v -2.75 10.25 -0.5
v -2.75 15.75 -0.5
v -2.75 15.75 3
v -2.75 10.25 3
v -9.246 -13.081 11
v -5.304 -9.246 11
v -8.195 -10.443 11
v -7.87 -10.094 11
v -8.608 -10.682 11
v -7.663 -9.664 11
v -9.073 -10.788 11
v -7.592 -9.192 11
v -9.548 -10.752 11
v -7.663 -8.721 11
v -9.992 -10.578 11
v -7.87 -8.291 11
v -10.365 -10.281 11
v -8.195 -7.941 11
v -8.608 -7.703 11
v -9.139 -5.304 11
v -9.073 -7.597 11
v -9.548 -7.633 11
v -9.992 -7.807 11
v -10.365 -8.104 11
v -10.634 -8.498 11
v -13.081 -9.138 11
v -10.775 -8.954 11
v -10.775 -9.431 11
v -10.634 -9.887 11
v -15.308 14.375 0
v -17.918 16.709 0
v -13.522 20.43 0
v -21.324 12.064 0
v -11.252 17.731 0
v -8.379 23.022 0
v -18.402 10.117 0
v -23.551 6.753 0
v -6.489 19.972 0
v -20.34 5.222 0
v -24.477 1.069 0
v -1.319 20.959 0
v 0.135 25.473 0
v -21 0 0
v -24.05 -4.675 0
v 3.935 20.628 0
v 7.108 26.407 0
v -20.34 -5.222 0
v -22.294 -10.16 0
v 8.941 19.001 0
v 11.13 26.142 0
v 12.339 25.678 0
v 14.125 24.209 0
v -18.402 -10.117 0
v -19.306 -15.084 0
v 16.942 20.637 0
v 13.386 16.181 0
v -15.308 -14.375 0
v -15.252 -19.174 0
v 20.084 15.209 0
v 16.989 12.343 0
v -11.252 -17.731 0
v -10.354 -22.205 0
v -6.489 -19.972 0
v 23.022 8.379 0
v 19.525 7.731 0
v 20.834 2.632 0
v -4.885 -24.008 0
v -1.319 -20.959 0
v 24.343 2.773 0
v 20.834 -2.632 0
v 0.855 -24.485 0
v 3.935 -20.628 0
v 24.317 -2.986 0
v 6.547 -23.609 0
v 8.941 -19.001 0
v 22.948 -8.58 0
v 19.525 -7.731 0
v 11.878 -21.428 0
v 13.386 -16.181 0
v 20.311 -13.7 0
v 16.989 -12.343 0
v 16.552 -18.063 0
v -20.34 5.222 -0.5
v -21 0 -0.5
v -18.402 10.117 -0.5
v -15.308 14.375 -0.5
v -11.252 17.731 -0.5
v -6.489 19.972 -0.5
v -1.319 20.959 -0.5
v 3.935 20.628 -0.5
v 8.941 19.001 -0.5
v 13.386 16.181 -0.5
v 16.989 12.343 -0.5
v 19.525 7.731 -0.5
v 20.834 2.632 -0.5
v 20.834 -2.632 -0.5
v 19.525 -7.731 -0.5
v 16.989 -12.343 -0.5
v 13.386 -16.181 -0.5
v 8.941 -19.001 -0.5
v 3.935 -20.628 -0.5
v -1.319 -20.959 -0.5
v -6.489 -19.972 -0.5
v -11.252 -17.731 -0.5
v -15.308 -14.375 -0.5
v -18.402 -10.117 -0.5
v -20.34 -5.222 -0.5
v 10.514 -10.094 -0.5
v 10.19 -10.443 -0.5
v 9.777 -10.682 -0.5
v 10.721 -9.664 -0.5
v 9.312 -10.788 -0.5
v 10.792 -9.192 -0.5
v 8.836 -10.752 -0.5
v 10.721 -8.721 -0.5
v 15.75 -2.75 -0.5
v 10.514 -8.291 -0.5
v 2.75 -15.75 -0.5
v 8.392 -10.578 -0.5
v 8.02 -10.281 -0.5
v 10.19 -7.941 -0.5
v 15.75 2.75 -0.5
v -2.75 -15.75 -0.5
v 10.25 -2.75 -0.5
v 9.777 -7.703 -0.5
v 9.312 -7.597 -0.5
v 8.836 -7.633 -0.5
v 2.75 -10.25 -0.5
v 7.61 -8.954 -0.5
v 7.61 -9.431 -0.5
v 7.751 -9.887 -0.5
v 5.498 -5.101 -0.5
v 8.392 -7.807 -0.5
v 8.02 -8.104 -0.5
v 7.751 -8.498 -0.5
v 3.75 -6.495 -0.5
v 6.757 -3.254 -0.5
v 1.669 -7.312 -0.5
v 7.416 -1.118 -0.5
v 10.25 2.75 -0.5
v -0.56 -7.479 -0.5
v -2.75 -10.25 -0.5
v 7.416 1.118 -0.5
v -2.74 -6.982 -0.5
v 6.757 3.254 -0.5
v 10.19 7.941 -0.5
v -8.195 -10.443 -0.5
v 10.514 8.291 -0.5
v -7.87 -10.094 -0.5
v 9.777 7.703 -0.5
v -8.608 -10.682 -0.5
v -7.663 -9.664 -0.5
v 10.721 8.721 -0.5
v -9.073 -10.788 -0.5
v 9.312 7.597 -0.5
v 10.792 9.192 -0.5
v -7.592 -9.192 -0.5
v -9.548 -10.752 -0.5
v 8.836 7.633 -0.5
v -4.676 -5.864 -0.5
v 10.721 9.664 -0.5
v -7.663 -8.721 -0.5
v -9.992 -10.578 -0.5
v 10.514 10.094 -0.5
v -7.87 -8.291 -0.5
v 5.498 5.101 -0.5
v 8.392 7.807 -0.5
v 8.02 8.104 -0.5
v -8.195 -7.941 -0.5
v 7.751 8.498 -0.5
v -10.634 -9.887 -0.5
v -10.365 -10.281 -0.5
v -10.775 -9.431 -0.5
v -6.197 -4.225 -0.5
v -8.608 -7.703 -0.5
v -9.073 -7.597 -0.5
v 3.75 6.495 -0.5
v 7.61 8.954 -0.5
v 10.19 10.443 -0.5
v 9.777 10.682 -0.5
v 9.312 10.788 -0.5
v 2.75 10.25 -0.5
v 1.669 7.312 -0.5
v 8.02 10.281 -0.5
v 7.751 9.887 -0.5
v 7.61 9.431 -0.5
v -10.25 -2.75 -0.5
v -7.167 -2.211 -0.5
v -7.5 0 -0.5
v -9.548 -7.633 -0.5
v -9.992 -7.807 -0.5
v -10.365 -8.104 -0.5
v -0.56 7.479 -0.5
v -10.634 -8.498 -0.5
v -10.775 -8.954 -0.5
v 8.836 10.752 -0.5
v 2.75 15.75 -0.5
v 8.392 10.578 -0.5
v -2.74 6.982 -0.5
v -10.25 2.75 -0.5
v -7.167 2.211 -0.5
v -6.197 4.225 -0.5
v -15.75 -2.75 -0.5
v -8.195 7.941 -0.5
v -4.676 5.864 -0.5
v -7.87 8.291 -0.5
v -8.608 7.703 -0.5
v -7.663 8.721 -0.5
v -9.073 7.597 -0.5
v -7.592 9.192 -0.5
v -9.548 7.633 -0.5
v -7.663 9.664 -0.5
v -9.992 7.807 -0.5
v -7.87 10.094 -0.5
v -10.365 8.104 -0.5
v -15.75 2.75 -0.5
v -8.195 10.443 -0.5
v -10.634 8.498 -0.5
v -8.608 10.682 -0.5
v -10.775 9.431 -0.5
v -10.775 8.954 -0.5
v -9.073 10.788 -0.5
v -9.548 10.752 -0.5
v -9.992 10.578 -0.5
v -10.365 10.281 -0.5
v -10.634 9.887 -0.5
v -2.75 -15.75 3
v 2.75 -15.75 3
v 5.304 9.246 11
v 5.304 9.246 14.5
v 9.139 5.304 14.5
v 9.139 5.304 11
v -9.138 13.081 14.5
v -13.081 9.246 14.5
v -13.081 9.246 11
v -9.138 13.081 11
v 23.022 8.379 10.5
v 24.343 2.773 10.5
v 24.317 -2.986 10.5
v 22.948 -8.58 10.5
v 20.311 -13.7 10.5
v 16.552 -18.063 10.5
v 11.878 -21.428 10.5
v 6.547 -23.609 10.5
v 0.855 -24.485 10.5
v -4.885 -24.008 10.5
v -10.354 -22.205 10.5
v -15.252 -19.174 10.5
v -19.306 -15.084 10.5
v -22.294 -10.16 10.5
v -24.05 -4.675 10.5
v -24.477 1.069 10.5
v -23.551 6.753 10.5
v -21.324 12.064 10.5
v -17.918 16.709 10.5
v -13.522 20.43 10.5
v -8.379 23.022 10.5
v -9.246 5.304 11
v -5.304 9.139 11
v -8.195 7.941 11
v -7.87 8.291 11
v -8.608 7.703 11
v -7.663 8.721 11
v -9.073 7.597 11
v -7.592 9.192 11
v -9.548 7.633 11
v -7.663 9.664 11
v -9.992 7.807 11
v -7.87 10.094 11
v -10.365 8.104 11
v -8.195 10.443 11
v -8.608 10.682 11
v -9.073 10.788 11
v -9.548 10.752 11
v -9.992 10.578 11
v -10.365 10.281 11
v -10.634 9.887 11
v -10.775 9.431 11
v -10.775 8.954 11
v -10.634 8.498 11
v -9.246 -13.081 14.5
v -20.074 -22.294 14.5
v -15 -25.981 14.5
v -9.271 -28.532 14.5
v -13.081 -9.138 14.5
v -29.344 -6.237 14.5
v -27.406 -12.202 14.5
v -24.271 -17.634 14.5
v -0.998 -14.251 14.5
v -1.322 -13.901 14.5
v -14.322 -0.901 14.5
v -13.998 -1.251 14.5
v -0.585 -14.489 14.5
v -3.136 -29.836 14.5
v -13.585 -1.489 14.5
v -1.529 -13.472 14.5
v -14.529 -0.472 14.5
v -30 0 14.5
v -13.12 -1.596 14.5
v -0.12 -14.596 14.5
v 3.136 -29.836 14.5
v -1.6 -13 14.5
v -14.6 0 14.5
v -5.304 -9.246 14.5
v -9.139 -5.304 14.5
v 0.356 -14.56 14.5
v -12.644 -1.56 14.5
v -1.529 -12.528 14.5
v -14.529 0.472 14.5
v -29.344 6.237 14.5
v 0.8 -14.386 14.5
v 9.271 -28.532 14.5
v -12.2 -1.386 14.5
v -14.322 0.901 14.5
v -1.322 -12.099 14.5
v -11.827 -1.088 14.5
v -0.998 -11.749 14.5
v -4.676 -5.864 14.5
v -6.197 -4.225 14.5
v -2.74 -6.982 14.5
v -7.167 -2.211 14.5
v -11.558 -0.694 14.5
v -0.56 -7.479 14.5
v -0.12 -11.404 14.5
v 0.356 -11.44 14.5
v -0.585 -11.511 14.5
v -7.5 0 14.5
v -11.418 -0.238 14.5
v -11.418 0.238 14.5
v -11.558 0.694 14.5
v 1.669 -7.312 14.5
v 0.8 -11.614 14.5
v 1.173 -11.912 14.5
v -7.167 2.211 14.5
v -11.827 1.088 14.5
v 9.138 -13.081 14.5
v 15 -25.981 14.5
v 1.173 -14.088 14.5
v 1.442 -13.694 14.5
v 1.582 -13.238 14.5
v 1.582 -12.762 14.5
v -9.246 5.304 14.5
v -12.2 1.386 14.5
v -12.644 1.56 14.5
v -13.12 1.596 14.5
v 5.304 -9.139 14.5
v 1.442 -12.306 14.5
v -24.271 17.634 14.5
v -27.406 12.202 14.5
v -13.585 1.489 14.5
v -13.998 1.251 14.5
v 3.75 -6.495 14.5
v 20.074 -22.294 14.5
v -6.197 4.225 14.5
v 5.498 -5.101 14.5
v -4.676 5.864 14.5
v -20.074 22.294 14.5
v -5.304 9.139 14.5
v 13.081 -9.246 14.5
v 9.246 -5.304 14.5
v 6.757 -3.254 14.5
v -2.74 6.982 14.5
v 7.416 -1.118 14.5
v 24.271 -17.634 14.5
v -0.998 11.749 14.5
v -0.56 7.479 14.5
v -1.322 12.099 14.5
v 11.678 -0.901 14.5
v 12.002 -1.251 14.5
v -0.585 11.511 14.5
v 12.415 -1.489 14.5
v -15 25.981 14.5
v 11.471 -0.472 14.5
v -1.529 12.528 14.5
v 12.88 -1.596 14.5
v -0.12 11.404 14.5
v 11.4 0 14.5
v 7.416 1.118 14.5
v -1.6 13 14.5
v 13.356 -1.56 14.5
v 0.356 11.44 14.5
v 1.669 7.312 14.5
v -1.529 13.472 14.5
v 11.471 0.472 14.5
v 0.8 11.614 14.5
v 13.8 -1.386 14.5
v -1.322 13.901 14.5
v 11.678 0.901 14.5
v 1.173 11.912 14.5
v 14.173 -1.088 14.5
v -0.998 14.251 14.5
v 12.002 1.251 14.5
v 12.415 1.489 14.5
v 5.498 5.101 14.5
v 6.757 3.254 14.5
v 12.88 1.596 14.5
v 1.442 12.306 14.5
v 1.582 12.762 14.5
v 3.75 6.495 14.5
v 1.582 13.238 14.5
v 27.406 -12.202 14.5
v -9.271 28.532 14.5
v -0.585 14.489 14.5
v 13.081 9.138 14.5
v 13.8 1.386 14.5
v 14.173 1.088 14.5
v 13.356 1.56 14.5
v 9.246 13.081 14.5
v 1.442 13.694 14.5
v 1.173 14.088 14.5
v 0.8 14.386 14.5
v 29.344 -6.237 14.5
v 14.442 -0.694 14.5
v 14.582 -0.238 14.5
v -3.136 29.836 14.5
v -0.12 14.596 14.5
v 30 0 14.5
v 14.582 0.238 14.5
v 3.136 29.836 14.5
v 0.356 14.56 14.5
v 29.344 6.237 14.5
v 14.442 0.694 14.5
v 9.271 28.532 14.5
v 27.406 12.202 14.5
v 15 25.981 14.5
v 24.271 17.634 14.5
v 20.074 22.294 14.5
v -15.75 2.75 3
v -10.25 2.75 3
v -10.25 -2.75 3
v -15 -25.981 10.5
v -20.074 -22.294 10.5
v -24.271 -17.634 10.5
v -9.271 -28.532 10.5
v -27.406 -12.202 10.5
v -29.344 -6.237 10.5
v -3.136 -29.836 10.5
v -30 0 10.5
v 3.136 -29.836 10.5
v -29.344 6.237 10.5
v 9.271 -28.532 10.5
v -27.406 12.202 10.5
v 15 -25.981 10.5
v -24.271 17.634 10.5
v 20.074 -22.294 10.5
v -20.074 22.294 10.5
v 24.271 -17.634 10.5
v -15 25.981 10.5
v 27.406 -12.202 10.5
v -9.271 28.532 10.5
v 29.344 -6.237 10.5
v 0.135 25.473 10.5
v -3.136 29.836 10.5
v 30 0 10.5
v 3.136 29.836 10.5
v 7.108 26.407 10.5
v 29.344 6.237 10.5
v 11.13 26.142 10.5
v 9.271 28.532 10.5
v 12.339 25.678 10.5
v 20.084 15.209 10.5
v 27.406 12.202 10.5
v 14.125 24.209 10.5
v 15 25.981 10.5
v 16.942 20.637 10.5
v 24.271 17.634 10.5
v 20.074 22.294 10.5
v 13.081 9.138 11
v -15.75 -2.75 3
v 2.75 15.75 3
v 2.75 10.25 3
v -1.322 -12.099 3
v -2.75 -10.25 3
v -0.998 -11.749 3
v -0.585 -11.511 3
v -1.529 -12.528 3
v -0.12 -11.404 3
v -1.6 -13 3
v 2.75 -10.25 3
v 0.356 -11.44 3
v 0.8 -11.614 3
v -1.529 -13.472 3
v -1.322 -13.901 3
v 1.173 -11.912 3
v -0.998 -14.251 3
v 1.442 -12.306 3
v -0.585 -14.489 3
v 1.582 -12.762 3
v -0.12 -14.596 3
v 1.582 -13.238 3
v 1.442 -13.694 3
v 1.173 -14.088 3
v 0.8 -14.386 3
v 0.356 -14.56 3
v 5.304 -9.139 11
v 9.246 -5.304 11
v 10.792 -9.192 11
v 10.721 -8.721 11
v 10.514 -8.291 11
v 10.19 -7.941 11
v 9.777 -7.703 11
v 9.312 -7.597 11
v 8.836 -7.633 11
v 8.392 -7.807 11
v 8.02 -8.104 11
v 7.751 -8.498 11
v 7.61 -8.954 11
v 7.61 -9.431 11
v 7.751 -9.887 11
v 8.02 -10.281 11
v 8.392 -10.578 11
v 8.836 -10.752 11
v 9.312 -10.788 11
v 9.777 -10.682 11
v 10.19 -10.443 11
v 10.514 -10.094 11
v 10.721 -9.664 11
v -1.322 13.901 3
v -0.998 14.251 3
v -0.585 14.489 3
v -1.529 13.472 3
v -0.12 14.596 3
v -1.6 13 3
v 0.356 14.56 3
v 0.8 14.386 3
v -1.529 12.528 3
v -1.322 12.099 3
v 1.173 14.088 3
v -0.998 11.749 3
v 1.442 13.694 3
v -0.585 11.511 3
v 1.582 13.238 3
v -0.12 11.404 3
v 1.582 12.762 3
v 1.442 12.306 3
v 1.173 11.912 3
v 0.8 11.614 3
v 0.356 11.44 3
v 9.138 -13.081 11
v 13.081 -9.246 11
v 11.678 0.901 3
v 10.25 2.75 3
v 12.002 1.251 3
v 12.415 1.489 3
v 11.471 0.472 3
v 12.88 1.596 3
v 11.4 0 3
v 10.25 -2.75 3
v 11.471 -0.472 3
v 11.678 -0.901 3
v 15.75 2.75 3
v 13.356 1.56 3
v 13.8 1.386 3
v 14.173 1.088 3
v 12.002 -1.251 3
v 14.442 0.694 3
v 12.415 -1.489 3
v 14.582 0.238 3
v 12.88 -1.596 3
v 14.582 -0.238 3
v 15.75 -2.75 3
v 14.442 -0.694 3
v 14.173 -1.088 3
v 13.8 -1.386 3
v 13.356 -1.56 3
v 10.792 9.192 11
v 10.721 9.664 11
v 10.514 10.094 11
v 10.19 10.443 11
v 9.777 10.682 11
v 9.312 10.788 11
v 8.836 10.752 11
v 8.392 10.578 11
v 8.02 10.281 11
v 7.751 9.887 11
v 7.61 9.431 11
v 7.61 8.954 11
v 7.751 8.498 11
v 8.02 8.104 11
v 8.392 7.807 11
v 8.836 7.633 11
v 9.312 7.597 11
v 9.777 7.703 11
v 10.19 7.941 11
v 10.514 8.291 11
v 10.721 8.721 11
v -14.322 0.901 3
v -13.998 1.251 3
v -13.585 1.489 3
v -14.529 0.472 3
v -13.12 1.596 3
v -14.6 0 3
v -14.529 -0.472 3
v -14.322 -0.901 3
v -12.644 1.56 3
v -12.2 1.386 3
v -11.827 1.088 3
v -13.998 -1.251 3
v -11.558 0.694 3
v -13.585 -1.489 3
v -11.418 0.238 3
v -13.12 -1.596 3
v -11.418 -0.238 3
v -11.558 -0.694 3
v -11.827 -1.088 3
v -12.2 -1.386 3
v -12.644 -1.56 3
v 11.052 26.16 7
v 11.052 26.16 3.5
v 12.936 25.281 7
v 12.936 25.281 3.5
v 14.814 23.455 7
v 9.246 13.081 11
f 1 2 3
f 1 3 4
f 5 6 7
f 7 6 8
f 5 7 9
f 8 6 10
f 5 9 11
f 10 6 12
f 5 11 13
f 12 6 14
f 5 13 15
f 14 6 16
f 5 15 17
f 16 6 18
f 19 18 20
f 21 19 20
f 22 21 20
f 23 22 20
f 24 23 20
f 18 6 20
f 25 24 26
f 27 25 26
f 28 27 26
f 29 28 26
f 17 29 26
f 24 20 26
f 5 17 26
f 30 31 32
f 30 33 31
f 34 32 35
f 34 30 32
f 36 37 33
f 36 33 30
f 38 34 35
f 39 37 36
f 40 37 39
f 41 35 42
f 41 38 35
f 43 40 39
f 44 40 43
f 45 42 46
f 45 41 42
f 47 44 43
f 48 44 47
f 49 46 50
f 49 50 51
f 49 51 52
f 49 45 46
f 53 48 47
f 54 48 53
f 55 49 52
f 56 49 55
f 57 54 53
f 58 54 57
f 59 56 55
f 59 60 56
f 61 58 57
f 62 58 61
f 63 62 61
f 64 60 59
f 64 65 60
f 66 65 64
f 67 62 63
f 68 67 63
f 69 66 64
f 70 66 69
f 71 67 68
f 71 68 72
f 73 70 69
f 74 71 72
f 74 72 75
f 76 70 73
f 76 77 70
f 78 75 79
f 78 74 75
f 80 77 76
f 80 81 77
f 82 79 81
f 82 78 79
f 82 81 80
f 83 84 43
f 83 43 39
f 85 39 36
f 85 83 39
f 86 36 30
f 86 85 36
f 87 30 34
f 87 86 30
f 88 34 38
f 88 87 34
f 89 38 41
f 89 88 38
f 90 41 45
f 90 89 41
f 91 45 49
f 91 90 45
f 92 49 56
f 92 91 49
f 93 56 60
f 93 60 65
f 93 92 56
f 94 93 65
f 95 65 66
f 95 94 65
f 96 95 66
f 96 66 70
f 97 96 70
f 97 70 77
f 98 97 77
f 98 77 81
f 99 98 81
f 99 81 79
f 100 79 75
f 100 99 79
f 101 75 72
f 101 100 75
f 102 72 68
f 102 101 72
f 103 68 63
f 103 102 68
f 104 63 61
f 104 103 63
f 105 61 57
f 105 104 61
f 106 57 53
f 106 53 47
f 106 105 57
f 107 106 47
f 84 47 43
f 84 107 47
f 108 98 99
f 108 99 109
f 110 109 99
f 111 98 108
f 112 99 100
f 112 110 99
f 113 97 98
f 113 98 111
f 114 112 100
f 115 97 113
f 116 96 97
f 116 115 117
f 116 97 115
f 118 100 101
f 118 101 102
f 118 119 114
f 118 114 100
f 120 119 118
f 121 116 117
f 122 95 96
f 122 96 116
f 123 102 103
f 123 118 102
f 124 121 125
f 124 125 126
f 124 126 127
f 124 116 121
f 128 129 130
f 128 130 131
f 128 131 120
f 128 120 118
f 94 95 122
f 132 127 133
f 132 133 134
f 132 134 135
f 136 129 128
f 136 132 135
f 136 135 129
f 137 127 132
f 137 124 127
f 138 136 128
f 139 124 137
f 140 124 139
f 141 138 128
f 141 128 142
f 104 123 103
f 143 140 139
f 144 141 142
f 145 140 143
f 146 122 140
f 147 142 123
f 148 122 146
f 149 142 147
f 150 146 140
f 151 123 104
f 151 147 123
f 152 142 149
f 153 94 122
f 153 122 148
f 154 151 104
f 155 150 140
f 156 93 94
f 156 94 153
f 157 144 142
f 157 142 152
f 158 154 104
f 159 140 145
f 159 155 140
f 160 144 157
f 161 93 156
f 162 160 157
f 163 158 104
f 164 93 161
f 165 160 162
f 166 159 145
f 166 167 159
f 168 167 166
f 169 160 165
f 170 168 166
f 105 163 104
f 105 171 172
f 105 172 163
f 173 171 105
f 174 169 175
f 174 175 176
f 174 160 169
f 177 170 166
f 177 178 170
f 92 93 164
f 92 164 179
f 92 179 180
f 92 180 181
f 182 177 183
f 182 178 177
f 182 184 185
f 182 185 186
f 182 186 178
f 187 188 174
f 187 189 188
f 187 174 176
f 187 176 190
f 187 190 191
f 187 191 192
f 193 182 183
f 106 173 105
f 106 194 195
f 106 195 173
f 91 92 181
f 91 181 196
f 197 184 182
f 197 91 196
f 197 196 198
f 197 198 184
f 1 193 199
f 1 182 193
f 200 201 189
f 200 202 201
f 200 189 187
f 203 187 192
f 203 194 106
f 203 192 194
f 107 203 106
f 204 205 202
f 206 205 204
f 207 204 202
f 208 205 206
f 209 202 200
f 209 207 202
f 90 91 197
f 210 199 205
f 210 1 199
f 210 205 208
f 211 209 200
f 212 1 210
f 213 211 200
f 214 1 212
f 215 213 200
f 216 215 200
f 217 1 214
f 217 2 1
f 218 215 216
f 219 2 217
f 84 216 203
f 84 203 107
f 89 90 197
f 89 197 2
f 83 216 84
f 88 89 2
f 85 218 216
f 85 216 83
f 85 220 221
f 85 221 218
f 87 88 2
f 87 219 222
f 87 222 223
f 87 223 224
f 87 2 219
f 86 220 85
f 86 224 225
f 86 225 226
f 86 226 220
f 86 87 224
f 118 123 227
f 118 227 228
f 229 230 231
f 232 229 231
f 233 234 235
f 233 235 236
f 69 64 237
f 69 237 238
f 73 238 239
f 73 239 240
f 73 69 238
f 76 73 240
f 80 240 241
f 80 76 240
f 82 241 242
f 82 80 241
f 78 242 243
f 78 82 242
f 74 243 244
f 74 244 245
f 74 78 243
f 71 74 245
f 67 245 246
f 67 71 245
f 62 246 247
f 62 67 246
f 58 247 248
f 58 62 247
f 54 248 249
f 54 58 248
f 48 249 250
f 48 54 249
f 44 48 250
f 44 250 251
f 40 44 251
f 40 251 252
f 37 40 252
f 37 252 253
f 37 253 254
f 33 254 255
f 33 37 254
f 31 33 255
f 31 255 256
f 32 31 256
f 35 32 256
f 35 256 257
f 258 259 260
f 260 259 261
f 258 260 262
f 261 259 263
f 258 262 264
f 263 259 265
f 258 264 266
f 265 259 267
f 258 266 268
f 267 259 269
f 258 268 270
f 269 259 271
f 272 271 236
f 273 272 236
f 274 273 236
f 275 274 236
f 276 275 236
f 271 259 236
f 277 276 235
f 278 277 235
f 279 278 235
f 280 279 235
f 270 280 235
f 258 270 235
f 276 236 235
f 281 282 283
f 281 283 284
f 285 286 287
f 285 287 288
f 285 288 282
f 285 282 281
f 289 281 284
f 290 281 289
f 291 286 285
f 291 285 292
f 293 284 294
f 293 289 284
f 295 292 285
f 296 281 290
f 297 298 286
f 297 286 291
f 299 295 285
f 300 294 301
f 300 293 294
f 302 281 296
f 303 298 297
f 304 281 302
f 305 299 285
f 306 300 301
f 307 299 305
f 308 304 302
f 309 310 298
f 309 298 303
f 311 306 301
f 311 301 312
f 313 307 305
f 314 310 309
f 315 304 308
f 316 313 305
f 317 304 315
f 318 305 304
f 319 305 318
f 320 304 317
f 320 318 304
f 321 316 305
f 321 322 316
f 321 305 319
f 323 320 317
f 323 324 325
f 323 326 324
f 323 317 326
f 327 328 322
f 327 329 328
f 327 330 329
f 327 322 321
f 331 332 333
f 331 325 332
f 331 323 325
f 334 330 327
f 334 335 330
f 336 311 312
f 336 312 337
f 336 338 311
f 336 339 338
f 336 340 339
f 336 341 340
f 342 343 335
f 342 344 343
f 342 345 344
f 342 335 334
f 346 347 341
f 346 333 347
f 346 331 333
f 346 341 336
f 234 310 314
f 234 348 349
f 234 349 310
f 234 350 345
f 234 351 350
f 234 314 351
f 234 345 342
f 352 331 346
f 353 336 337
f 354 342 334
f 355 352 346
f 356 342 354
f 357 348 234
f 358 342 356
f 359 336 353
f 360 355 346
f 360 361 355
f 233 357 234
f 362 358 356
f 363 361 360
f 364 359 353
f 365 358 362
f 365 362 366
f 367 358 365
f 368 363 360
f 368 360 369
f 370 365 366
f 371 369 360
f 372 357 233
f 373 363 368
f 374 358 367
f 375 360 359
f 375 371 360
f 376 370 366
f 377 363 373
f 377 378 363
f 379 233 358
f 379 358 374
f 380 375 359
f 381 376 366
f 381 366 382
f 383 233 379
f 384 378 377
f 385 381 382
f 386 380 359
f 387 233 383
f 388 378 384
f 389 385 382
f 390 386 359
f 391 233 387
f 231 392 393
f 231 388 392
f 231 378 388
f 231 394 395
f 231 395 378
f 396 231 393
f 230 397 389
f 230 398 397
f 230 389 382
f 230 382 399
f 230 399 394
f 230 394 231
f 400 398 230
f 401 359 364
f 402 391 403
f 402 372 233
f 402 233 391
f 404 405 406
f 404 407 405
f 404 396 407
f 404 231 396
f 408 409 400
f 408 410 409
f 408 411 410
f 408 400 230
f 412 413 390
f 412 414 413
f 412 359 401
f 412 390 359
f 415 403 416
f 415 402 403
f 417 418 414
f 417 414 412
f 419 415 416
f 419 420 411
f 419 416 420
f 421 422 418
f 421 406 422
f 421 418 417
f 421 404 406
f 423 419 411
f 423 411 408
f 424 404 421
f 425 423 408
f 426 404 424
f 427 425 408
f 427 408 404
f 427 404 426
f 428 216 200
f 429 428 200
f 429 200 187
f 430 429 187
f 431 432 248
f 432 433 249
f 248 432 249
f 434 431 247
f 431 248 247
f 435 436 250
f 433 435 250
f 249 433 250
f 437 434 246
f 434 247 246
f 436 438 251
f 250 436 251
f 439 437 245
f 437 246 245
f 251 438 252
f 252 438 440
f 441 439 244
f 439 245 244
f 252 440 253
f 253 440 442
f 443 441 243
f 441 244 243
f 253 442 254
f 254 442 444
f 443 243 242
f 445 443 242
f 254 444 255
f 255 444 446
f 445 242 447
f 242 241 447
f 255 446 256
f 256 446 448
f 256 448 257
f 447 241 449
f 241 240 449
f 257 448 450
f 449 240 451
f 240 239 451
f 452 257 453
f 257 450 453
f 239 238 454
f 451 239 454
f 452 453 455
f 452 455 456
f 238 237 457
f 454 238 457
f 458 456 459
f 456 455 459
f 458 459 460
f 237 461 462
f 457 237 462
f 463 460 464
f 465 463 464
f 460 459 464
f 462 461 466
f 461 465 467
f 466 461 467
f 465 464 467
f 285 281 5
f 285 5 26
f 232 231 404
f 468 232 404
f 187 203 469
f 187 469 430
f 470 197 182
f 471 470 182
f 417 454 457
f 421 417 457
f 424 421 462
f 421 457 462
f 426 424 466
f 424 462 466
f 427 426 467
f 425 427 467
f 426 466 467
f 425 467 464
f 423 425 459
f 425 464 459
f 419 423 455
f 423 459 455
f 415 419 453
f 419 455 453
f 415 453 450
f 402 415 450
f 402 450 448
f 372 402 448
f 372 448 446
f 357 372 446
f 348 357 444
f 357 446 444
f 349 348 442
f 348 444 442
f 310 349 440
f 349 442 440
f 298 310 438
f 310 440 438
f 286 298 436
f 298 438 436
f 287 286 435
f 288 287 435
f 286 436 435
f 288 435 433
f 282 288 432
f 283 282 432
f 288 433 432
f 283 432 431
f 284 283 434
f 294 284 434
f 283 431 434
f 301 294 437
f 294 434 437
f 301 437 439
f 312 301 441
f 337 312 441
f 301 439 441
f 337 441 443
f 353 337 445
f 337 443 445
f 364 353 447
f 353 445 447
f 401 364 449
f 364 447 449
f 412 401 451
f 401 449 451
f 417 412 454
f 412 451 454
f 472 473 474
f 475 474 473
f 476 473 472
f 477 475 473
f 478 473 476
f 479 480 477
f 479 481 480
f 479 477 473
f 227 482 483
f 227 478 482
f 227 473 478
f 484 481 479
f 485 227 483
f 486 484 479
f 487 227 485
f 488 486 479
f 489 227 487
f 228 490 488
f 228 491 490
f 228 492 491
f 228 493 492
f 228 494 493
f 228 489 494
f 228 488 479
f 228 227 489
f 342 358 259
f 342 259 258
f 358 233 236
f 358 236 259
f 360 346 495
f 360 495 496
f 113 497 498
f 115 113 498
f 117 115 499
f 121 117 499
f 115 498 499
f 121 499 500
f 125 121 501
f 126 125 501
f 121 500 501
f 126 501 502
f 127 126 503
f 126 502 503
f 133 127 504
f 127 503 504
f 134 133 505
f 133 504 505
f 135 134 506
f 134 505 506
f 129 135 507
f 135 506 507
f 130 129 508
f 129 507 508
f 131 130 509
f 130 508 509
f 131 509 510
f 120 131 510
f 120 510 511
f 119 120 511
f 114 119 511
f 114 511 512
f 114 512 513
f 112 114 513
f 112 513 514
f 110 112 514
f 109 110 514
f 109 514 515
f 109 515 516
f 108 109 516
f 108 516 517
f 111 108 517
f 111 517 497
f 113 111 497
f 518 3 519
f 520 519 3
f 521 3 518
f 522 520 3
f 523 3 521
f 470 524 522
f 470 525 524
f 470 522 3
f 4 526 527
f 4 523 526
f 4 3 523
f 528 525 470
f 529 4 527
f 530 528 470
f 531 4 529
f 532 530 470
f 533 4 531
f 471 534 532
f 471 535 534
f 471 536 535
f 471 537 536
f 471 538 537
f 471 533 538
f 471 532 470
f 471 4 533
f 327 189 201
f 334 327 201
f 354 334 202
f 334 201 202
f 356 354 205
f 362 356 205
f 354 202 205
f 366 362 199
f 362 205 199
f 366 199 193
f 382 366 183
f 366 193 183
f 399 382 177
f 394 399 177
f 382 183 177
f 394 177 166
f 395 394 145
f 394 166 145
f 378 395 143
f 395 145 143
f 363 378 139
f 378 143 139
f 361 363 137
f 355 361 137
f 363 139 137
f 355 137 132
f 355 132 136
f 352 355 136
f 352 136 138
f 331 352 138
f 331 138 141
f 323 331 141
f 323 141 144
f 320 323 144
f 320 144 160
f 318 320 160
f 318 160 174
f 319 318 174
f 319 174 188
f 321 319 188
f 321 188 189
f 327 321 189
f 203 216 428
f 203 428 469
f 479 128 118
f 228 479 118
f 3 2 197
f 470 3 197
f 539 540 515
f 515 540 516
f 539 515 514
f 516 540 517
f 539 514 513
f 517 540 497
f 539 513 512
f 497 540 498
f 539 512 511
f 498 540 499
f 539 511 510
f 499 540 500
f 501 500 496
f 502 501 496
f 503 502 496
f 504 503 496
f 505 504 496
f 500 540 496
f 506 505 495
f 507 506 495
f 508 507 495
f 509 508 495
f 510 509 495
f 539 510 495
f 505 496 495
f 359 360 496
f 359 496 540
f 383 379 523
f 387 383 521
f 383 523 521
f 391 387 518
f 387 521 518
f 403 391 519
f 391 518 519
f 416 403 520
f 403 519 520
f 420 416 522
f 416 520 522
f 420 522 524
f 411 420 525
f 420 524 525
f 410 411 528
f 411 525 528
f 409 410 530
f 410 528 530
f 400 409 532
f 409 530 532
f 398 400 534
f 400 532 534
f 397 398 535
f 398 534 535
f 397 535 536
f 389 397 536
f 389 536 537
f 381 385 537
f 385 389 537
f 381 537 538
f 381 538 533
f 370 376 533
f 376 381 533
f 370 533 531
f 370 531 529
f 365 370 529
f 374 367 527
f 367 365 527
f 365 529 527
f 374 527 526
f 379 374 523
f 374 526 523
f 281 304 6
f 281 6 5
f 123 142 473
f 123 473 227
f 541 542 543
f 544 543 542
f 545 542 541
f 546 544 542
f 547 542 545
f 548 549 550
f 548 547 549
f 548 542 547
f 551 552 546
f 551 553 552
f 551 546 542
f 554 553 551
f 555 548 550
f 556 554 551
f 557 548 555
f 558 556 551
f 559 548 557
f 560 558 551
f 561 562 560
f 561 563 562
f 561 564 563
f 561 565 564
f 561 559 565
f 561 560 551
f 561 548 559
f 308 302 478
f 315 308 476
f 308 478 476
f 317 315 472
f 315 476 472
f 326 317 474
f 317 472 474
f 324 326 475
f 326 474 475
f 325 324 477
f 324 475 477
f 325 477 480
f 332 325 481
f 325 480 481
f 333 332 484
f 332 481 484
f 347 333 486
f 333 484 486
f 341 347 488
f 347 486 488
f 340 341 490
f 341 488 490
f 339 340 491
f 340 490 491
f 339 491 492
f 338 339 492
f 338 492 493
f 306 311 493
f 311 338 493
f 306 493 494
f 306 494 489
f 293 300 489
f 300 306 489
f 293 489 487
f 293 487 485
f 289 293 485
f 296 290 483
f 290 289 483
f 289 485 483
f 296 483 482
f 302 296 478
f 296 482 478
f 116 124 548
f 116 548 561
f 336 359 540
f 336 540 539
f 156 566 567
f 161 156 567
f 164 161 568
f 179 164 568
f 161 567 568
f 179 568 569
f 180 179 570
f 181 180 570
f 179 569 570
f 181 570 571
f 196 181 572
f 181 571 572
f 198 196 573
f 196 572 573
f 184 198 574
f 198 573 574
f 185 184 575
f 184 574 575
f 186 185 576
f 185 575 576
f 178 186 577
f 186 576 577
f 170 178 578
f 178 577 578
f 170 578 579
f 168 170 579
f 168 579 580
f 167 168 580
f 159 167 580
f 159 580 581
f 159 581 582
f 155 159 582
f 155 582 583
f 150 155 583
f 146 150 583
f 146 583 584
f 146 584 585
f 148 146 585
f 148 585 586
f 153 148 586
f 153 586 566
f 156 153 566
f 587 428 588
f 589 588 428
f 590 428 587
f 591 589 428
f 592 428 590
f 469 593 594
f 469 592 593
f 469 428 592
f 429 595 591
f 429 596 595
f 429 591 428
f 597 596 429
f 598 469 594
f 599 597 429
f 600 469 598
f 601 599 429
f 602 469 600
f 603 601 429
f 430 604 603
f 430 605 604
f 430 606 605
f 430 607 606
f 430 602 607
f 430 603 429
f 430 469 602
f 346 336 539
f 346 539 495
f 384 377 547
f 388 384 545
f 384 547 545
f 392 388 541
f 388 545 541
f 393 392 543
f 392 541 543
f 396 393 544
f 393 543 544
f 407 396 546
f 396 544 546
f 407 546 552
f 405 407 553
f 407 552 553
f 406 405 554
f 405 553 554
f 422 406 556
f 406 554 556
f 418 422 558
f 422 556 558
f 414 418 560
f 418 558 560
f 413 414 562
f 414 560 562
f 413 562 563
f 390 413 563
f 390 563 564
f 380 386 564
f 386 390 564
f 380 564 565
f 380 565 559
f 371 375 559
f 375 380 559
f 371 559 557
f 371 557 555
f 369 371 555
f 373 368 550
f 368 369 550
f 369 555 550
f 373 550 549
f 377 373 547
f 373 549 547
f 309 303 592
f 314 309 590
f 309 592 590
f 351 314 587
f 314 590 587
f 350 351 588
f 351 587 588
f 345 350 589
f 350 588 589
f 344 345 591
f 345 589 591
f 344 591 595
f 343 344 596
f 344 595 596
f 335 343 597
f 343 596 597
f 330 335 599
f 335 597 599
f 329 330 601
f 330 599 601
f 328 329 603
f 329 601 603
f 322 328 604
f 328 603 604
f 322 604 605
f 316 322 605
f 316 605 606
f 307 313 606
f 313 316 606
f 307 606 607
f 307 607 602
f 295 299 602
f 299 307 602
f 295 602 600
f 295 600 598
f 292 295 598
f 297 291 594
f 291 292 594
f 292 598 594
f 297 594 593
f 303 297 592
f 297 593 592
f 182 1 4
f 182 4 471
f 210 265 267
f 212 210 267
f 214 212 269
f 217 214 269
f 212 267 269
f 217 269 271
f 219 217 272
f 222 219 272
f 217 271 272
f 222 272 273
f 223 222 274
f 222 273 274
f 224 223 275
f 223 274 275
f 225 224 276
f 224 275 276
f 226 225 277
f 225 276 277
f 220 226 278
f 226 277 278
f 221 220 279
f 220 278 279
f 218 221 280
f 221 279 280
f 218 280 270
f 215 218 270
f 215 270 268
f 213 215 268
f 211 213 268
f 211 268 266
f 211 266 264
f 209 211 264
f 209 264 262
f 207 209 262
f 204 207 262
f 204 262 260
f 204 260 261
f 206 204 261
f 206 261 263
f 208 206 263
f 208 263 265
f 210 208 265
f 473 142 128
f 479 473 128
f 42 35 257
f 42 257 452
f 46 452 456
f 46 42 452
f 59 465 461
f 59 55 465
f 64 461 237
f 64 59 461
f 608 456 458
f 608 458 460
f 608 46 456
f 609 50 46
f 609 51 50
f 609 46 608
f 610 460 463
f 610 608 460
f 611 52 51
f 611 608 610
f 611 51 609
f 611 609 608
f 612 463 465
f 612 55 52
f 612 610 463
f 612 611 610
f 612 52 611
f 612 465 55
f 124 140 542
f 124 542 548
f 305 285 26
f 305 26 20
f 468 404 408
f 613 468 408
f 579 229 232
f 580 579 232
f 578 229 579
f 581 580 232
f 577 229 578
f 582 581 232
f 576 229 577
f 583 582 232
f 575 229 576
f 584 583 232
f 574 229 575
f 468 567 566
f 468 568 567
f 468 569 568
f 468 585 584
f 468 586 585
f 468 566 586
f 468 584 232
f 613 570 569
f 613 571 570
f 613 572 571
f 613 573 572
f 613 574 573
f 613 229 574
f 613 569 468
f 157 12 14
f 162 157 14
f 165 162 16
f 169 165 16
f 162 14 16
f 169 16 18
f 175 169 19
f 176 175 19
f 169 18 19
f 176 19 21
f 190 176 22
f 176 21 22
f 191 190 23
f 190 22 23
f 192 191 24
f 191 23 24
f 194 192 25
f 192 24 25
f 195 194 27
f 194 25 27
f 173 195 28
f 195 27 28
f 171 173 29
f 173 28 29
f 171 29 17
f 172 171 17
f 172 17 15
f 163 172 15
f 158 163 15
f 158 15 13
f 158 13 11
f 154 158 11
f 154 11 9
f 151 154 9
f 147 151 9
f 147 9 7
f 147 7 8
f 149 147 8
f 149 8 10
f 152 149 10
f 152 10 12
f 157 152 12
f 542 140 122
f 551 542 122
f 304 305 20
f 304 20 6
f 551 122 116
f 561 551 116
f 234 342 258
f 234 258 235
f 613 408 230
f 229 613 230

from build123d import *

# Parameters (mm, degrees)
SKETCH1_R           = 21
SKETCH1_R_2         = 2.85
SKETCH1_R_3         = 1.6
BOSS_EXTRUDE1_DEPTH = 10.5
SKETCH2_R           = 24.5
SKETCH2_R_2         = 21
BOSS_EXTRUDE3_DEPTH = 10.5
SKETCH4_R           = 30
SKETCH4_R_2         = 1.6
BOSS_EXTRUDE5_DEPTH = 4
BOSS_EXTRUDE4_START = 0.5
SKETCH3_R           = 21
SKETCH3_R_2         = 1.6
BOSS_EXTRUDE4_DEPTH = 0.5
SKETCH6_W           = 5.5
SKETCH6_H           = 5.5
CUT_EXTRUDE2_DEPTH  = 3.5
SKETCH7_R           = 1.6
CUT_EXTRUDE3_DEPTH  = 46.000000133
SKETCH7_3_R         = 1.6
CUT_EXTRUDE4_DEPTH  = 3.5
SKETCH8_R           = 7.5
CUT_EXTRUDE5_DEPTH  = 46.000000133


with BuildPart() as part:
    # Sketch1 → Boss-Extrude1 (new body)
    # profile 1 of 5: a face of its own
    with BuildSketch(Plane(origin=(0, 0, 0), x_dir=(0, 1, 0), z_dir=(0, 0, 1))):
        with Locations(Location((0, 0, 0), (0, 0, 90))):
            Circle(SKETCH1_R)
        with Locations((-13, 0)):
            Circle(SKETCH1_R_2, mode=Mode.SUBTRACT)
        with Locations((0, -13)):
            Circle(SKETCH1_R_2, mode=Mode.SUBTRACT)
        with Locations((13, 0)):
            Circle(SKETCH1_R_2, mode=Mode.SUBTRACT)
        with Locations((0, 13)):
            Circle(SKETCH1_R_2, mode=Mode.SUBTRACT)
    # profile 2 of 5: a face of its own
    with BuildSketch(Plane(origin=(0, 0, 0), x_dir=(0, 1, 0), z_dir=(0, 0, 1))):
        with Locations((-13, 0)):
            Circle(SKETCH1_R_2)
        with Locations(Location((-13, 0, 0), (0, 0, 90))):
            Circle(SKETCH1_R_3, mode=Mode.SUBTRACT)
    # profile 3 of 5: a face of its own
    with BuildSketch(Plane(origin=(0, 0, 0), x_dir=(0, 1, 0), z_dir=(0, 0, 1))):
        with Locations((0, 13)):
            Circle(SKETCH1_R_2)
        with Locations(Location((0, 13, 0), (0, 0, 90))):
            Circle(SKETCH1_R_3, mode=Mode.SUBTRACT)
    # profile 4 of 5: a face of its own
    with BuildSketch(Plane(origin=(0, 0, 0), x_dir=(0, 1, 0), z_dir=(0, 0, 1))):
        with Locations((13, 0)):
            Circle(SKETCH1_R_2)
        with Locations(Location((13, 0, 0), (0, 0, 90))):
            Circle(SKETCH1_R_3, mode=Mode.SUBTRACT)
    # profile 5 of 5: a face of its own
    with BuildSketch(Plane(origin=(0, 0, 0), x_dir=(0, 1, 0), z_dir=(0, 0, 1))):
        with Locations((0, -13)):
            Circle(SKETCH1_R_2)
        with Locations(Location((0, -13, 0), (0, 0, 90))):
            Circle(SKETCH1_R_3, mode=Mode.SUBTRACT)
    extrude(amount=BOSS_EXTRUDE1_DEPTH)

    # Sketch2 → Boss-Extrude3 (add)
    # profile 1 of 2: a face of its own
    with BuildSketch(Plane(origin=(0, 0, 0), x_dir=(1, 0, 0), z_dir=(0, 0, -1))):
        Circle(SKETCH2_R)
        Circle(SKETCH2_R_2, mode=Mode.SUBTRACT)
    # profile 2 of 2: a face of its own
    with BuildSketch(Plane(origin=(0, 0, 0), x_dir=(1, 0, 0), z_dir=(0, 0, -1))):
        with BuildLine():
            ThreePointArc((23.022469209, -8.379493511), (10.354147413, -22.204540782), (-8.379493511, -23.022469209))
            add(Edge.make_bspline(
                [(-8.379493511, -23.022469209), (0.077740076, -26.100650499), (9.399453165, -27.107478442), (14.723681196, -24.624750138), (19.944287919, -16.836727099), (23.022469209, -8.379493511)],
                knots=[0, 0, 0, 0, 0.45, 0.55, 1, 1, 1, 1], degree=3))
        make_face()
    extrude(amount=-BOSS_EXTRUDE3_DEPTH)

    # Sketch4 → Boss-Extrude5 (add)
    with BuildSketch(Plane.XY.offset(10.5)):
        Circle(SKETCH4_R)
        with Locations(Location((-13, 0, 0), (0, 0, 180))):
            Circle(SKETCH4_R_2, mode=Mode.SUBTRACT)
        with Locations(Location((0, 13, 0), (0, 0, 180))):
            Circle(SKETCH4_R_2, mode=Mode.SUBTRACT)
        with Locations(Location((13, 0, 0), (0, 0, 180))):
            Circle(SKETCH4_R_2, mode=Mode.SUBTRACT)
        with Locations(Location((0, -13, 0), (0, 0, 180))):
            Circle(SKETCH4_R_2, mode=Mode.SUBTRACT)
    extrude(amount=BOSS_EXTRUDE5_DEPTH)

    # Sketch3 → Boss-Extrude4 (add)
    with BuildSketch(Plane(origin=(0, 0, 0), x_dir=(1, 0, 0), z_dir=(0, 0, -1)).offset(BOSS_EXTRUDE4_START)):
        with Locations(Location((0, 0, 0), (0, 0, 180))):
            Circle(SKETCH3_R)
        with Locations(Location((-13, 0, 0), (0, 0, 180))):
            Circle(SKETCH3_R_2, mode=Mode.SUBTRACT)
        with Locations(Location((0, 13, 0), (0, 0, 180))):
            Circle(SKETCH3_R_2, mode=Mode.SUBTRACT)
        with Locations(Location((13, 0, 0), (0, 0, 180))):
            Circle(SKETCH3_R_2, mode=Mode.SUBTRACT)
        with Locations(Location((0, -13, 0), (0, 0, 180))):
            Circle(SKETCH3_R_2, mode=Mode.SUBTRACT)
    extrude(amount=-BOSS_EXTRUDE4_DEPTH)

    # Sketch6 → Cut-Extrude2 (cut)
    with BuildSketch(Plane(origin=(0, 0, -0.5), x_dir=(1, 0, 0), z_dir=(0, 0, -1))):
        with Locations((13, 0)):
            Rectangle(SKETCH6_W, SKETCH6_H)
        with Locations((0, 13)):
            Rectangle(SKETCH6_W, SKETCH6_H)
        with Locations((0, -13)):
            Rectangle(SKETCH6_W, SKETCH6_H)
        with Locations((-13, 0)):
            Rectangle(SKETCH6_W, SKETCH6_H)
    extrude(amount=-CUT_EXTRUDE2_DEPTH, mode=Mode.SUBTRACT)

    # Sketch7 → Cut-Extrude3 (cut, through all)
    with BuildSketch(Plane.XY.offset(14.5)):
        with Locations((9.192388155, 9.192388155)):
            Circle(SKETCH7_R)
        with Locations((9.192388155, -9.192388155)):
            Circle(SKETCH7_R)
        with Locations((-9.192388155, -9.192388155)):
            Circle(SKETCH7_R)
        with Locations((-9.192388155, 9.192388155)):
            Circle(SKETCH7_R)
    extrude(amount=-CUT_EXTRUDE3_DEPTH, mode=Mode.SUBTRACT)

    # Sketch7<3> → Cut-Extrude4 (cut)
    # profile 1 of 4: a face of its own
    with BuildSketch(Plane.XY.offset(14.5)):
        Polygon((9.245595054, 13.080678059), (5.304110209, 9.246461763), (9.139181257, 5.304098252), (13.080666102, 9.138314547), align=None)
        with Locations((9.192388155, 9.192388155)):
            Circle(SKETCH7_3_R, mode=Mode.SUBTRACT)
    # profile 2 of 4: a face of its own
    with BuildSketch(Plane.XY.offset(14.5)):
        Polygon((9.138314547, -13.080666102), (5.304098252, -9.139181257), (9.246461763, -5.304110209), (13.080678059, -9.245595054), align=None)
        with Locations((9.192388155, -9.192388155)):
            Circle(SKETCH7_3_R, mode=Mode.SUBTRACT)
    # profile 3 of 4: a face of its own
    with BuildSketch(Plane.XY.offset(14.5)):
        Polygon((-13.080666102, -9.138314547), (-9.139181257, -5.304098252), (-5.304110209, -9.246461763), (-9.245595054, -13.080678059), align=None)
        with Locations((-9.192388155, -9.192388155)):
            Circle(SKETCH7_3_R, mode=Mode.SUBTRACT)
    # profile 4 of 4: a face of its own
    with BuildSketch(Plane.XY.offset(14.5)):
        Polygon((-9.138314547, 13.080666102), (-5.304098252, 9.139181257), (-9.246461763, 5.304110209), (-13.080678059, 9.245595054), align=None)
        with Locations((-9.192388155, 9.192388155)):
            Circle(SKETCH7_3_R, mode=Mode.SUBTRACT)
    extrude(amount=-CUT_EXTRUDE4_DEPTH, mode=Mode.SUBTRACT)

    # Sketch8 → Cut-Extrude5 (cut, through all)
    with BuildSketch(Plane(origin=(0, 0, -0.5), x_dir=(1, 0, 0), z_dir=(0, 0, -1))):
        with Locations(Location((0, 0, 0), (0, 0, 180))):
            Circle(SKETCH8_R)
    extrude(amount=-CUT_EXTRUDE5_DEPTH, mode=Mode.SUBTRACT)


solid = part.part
